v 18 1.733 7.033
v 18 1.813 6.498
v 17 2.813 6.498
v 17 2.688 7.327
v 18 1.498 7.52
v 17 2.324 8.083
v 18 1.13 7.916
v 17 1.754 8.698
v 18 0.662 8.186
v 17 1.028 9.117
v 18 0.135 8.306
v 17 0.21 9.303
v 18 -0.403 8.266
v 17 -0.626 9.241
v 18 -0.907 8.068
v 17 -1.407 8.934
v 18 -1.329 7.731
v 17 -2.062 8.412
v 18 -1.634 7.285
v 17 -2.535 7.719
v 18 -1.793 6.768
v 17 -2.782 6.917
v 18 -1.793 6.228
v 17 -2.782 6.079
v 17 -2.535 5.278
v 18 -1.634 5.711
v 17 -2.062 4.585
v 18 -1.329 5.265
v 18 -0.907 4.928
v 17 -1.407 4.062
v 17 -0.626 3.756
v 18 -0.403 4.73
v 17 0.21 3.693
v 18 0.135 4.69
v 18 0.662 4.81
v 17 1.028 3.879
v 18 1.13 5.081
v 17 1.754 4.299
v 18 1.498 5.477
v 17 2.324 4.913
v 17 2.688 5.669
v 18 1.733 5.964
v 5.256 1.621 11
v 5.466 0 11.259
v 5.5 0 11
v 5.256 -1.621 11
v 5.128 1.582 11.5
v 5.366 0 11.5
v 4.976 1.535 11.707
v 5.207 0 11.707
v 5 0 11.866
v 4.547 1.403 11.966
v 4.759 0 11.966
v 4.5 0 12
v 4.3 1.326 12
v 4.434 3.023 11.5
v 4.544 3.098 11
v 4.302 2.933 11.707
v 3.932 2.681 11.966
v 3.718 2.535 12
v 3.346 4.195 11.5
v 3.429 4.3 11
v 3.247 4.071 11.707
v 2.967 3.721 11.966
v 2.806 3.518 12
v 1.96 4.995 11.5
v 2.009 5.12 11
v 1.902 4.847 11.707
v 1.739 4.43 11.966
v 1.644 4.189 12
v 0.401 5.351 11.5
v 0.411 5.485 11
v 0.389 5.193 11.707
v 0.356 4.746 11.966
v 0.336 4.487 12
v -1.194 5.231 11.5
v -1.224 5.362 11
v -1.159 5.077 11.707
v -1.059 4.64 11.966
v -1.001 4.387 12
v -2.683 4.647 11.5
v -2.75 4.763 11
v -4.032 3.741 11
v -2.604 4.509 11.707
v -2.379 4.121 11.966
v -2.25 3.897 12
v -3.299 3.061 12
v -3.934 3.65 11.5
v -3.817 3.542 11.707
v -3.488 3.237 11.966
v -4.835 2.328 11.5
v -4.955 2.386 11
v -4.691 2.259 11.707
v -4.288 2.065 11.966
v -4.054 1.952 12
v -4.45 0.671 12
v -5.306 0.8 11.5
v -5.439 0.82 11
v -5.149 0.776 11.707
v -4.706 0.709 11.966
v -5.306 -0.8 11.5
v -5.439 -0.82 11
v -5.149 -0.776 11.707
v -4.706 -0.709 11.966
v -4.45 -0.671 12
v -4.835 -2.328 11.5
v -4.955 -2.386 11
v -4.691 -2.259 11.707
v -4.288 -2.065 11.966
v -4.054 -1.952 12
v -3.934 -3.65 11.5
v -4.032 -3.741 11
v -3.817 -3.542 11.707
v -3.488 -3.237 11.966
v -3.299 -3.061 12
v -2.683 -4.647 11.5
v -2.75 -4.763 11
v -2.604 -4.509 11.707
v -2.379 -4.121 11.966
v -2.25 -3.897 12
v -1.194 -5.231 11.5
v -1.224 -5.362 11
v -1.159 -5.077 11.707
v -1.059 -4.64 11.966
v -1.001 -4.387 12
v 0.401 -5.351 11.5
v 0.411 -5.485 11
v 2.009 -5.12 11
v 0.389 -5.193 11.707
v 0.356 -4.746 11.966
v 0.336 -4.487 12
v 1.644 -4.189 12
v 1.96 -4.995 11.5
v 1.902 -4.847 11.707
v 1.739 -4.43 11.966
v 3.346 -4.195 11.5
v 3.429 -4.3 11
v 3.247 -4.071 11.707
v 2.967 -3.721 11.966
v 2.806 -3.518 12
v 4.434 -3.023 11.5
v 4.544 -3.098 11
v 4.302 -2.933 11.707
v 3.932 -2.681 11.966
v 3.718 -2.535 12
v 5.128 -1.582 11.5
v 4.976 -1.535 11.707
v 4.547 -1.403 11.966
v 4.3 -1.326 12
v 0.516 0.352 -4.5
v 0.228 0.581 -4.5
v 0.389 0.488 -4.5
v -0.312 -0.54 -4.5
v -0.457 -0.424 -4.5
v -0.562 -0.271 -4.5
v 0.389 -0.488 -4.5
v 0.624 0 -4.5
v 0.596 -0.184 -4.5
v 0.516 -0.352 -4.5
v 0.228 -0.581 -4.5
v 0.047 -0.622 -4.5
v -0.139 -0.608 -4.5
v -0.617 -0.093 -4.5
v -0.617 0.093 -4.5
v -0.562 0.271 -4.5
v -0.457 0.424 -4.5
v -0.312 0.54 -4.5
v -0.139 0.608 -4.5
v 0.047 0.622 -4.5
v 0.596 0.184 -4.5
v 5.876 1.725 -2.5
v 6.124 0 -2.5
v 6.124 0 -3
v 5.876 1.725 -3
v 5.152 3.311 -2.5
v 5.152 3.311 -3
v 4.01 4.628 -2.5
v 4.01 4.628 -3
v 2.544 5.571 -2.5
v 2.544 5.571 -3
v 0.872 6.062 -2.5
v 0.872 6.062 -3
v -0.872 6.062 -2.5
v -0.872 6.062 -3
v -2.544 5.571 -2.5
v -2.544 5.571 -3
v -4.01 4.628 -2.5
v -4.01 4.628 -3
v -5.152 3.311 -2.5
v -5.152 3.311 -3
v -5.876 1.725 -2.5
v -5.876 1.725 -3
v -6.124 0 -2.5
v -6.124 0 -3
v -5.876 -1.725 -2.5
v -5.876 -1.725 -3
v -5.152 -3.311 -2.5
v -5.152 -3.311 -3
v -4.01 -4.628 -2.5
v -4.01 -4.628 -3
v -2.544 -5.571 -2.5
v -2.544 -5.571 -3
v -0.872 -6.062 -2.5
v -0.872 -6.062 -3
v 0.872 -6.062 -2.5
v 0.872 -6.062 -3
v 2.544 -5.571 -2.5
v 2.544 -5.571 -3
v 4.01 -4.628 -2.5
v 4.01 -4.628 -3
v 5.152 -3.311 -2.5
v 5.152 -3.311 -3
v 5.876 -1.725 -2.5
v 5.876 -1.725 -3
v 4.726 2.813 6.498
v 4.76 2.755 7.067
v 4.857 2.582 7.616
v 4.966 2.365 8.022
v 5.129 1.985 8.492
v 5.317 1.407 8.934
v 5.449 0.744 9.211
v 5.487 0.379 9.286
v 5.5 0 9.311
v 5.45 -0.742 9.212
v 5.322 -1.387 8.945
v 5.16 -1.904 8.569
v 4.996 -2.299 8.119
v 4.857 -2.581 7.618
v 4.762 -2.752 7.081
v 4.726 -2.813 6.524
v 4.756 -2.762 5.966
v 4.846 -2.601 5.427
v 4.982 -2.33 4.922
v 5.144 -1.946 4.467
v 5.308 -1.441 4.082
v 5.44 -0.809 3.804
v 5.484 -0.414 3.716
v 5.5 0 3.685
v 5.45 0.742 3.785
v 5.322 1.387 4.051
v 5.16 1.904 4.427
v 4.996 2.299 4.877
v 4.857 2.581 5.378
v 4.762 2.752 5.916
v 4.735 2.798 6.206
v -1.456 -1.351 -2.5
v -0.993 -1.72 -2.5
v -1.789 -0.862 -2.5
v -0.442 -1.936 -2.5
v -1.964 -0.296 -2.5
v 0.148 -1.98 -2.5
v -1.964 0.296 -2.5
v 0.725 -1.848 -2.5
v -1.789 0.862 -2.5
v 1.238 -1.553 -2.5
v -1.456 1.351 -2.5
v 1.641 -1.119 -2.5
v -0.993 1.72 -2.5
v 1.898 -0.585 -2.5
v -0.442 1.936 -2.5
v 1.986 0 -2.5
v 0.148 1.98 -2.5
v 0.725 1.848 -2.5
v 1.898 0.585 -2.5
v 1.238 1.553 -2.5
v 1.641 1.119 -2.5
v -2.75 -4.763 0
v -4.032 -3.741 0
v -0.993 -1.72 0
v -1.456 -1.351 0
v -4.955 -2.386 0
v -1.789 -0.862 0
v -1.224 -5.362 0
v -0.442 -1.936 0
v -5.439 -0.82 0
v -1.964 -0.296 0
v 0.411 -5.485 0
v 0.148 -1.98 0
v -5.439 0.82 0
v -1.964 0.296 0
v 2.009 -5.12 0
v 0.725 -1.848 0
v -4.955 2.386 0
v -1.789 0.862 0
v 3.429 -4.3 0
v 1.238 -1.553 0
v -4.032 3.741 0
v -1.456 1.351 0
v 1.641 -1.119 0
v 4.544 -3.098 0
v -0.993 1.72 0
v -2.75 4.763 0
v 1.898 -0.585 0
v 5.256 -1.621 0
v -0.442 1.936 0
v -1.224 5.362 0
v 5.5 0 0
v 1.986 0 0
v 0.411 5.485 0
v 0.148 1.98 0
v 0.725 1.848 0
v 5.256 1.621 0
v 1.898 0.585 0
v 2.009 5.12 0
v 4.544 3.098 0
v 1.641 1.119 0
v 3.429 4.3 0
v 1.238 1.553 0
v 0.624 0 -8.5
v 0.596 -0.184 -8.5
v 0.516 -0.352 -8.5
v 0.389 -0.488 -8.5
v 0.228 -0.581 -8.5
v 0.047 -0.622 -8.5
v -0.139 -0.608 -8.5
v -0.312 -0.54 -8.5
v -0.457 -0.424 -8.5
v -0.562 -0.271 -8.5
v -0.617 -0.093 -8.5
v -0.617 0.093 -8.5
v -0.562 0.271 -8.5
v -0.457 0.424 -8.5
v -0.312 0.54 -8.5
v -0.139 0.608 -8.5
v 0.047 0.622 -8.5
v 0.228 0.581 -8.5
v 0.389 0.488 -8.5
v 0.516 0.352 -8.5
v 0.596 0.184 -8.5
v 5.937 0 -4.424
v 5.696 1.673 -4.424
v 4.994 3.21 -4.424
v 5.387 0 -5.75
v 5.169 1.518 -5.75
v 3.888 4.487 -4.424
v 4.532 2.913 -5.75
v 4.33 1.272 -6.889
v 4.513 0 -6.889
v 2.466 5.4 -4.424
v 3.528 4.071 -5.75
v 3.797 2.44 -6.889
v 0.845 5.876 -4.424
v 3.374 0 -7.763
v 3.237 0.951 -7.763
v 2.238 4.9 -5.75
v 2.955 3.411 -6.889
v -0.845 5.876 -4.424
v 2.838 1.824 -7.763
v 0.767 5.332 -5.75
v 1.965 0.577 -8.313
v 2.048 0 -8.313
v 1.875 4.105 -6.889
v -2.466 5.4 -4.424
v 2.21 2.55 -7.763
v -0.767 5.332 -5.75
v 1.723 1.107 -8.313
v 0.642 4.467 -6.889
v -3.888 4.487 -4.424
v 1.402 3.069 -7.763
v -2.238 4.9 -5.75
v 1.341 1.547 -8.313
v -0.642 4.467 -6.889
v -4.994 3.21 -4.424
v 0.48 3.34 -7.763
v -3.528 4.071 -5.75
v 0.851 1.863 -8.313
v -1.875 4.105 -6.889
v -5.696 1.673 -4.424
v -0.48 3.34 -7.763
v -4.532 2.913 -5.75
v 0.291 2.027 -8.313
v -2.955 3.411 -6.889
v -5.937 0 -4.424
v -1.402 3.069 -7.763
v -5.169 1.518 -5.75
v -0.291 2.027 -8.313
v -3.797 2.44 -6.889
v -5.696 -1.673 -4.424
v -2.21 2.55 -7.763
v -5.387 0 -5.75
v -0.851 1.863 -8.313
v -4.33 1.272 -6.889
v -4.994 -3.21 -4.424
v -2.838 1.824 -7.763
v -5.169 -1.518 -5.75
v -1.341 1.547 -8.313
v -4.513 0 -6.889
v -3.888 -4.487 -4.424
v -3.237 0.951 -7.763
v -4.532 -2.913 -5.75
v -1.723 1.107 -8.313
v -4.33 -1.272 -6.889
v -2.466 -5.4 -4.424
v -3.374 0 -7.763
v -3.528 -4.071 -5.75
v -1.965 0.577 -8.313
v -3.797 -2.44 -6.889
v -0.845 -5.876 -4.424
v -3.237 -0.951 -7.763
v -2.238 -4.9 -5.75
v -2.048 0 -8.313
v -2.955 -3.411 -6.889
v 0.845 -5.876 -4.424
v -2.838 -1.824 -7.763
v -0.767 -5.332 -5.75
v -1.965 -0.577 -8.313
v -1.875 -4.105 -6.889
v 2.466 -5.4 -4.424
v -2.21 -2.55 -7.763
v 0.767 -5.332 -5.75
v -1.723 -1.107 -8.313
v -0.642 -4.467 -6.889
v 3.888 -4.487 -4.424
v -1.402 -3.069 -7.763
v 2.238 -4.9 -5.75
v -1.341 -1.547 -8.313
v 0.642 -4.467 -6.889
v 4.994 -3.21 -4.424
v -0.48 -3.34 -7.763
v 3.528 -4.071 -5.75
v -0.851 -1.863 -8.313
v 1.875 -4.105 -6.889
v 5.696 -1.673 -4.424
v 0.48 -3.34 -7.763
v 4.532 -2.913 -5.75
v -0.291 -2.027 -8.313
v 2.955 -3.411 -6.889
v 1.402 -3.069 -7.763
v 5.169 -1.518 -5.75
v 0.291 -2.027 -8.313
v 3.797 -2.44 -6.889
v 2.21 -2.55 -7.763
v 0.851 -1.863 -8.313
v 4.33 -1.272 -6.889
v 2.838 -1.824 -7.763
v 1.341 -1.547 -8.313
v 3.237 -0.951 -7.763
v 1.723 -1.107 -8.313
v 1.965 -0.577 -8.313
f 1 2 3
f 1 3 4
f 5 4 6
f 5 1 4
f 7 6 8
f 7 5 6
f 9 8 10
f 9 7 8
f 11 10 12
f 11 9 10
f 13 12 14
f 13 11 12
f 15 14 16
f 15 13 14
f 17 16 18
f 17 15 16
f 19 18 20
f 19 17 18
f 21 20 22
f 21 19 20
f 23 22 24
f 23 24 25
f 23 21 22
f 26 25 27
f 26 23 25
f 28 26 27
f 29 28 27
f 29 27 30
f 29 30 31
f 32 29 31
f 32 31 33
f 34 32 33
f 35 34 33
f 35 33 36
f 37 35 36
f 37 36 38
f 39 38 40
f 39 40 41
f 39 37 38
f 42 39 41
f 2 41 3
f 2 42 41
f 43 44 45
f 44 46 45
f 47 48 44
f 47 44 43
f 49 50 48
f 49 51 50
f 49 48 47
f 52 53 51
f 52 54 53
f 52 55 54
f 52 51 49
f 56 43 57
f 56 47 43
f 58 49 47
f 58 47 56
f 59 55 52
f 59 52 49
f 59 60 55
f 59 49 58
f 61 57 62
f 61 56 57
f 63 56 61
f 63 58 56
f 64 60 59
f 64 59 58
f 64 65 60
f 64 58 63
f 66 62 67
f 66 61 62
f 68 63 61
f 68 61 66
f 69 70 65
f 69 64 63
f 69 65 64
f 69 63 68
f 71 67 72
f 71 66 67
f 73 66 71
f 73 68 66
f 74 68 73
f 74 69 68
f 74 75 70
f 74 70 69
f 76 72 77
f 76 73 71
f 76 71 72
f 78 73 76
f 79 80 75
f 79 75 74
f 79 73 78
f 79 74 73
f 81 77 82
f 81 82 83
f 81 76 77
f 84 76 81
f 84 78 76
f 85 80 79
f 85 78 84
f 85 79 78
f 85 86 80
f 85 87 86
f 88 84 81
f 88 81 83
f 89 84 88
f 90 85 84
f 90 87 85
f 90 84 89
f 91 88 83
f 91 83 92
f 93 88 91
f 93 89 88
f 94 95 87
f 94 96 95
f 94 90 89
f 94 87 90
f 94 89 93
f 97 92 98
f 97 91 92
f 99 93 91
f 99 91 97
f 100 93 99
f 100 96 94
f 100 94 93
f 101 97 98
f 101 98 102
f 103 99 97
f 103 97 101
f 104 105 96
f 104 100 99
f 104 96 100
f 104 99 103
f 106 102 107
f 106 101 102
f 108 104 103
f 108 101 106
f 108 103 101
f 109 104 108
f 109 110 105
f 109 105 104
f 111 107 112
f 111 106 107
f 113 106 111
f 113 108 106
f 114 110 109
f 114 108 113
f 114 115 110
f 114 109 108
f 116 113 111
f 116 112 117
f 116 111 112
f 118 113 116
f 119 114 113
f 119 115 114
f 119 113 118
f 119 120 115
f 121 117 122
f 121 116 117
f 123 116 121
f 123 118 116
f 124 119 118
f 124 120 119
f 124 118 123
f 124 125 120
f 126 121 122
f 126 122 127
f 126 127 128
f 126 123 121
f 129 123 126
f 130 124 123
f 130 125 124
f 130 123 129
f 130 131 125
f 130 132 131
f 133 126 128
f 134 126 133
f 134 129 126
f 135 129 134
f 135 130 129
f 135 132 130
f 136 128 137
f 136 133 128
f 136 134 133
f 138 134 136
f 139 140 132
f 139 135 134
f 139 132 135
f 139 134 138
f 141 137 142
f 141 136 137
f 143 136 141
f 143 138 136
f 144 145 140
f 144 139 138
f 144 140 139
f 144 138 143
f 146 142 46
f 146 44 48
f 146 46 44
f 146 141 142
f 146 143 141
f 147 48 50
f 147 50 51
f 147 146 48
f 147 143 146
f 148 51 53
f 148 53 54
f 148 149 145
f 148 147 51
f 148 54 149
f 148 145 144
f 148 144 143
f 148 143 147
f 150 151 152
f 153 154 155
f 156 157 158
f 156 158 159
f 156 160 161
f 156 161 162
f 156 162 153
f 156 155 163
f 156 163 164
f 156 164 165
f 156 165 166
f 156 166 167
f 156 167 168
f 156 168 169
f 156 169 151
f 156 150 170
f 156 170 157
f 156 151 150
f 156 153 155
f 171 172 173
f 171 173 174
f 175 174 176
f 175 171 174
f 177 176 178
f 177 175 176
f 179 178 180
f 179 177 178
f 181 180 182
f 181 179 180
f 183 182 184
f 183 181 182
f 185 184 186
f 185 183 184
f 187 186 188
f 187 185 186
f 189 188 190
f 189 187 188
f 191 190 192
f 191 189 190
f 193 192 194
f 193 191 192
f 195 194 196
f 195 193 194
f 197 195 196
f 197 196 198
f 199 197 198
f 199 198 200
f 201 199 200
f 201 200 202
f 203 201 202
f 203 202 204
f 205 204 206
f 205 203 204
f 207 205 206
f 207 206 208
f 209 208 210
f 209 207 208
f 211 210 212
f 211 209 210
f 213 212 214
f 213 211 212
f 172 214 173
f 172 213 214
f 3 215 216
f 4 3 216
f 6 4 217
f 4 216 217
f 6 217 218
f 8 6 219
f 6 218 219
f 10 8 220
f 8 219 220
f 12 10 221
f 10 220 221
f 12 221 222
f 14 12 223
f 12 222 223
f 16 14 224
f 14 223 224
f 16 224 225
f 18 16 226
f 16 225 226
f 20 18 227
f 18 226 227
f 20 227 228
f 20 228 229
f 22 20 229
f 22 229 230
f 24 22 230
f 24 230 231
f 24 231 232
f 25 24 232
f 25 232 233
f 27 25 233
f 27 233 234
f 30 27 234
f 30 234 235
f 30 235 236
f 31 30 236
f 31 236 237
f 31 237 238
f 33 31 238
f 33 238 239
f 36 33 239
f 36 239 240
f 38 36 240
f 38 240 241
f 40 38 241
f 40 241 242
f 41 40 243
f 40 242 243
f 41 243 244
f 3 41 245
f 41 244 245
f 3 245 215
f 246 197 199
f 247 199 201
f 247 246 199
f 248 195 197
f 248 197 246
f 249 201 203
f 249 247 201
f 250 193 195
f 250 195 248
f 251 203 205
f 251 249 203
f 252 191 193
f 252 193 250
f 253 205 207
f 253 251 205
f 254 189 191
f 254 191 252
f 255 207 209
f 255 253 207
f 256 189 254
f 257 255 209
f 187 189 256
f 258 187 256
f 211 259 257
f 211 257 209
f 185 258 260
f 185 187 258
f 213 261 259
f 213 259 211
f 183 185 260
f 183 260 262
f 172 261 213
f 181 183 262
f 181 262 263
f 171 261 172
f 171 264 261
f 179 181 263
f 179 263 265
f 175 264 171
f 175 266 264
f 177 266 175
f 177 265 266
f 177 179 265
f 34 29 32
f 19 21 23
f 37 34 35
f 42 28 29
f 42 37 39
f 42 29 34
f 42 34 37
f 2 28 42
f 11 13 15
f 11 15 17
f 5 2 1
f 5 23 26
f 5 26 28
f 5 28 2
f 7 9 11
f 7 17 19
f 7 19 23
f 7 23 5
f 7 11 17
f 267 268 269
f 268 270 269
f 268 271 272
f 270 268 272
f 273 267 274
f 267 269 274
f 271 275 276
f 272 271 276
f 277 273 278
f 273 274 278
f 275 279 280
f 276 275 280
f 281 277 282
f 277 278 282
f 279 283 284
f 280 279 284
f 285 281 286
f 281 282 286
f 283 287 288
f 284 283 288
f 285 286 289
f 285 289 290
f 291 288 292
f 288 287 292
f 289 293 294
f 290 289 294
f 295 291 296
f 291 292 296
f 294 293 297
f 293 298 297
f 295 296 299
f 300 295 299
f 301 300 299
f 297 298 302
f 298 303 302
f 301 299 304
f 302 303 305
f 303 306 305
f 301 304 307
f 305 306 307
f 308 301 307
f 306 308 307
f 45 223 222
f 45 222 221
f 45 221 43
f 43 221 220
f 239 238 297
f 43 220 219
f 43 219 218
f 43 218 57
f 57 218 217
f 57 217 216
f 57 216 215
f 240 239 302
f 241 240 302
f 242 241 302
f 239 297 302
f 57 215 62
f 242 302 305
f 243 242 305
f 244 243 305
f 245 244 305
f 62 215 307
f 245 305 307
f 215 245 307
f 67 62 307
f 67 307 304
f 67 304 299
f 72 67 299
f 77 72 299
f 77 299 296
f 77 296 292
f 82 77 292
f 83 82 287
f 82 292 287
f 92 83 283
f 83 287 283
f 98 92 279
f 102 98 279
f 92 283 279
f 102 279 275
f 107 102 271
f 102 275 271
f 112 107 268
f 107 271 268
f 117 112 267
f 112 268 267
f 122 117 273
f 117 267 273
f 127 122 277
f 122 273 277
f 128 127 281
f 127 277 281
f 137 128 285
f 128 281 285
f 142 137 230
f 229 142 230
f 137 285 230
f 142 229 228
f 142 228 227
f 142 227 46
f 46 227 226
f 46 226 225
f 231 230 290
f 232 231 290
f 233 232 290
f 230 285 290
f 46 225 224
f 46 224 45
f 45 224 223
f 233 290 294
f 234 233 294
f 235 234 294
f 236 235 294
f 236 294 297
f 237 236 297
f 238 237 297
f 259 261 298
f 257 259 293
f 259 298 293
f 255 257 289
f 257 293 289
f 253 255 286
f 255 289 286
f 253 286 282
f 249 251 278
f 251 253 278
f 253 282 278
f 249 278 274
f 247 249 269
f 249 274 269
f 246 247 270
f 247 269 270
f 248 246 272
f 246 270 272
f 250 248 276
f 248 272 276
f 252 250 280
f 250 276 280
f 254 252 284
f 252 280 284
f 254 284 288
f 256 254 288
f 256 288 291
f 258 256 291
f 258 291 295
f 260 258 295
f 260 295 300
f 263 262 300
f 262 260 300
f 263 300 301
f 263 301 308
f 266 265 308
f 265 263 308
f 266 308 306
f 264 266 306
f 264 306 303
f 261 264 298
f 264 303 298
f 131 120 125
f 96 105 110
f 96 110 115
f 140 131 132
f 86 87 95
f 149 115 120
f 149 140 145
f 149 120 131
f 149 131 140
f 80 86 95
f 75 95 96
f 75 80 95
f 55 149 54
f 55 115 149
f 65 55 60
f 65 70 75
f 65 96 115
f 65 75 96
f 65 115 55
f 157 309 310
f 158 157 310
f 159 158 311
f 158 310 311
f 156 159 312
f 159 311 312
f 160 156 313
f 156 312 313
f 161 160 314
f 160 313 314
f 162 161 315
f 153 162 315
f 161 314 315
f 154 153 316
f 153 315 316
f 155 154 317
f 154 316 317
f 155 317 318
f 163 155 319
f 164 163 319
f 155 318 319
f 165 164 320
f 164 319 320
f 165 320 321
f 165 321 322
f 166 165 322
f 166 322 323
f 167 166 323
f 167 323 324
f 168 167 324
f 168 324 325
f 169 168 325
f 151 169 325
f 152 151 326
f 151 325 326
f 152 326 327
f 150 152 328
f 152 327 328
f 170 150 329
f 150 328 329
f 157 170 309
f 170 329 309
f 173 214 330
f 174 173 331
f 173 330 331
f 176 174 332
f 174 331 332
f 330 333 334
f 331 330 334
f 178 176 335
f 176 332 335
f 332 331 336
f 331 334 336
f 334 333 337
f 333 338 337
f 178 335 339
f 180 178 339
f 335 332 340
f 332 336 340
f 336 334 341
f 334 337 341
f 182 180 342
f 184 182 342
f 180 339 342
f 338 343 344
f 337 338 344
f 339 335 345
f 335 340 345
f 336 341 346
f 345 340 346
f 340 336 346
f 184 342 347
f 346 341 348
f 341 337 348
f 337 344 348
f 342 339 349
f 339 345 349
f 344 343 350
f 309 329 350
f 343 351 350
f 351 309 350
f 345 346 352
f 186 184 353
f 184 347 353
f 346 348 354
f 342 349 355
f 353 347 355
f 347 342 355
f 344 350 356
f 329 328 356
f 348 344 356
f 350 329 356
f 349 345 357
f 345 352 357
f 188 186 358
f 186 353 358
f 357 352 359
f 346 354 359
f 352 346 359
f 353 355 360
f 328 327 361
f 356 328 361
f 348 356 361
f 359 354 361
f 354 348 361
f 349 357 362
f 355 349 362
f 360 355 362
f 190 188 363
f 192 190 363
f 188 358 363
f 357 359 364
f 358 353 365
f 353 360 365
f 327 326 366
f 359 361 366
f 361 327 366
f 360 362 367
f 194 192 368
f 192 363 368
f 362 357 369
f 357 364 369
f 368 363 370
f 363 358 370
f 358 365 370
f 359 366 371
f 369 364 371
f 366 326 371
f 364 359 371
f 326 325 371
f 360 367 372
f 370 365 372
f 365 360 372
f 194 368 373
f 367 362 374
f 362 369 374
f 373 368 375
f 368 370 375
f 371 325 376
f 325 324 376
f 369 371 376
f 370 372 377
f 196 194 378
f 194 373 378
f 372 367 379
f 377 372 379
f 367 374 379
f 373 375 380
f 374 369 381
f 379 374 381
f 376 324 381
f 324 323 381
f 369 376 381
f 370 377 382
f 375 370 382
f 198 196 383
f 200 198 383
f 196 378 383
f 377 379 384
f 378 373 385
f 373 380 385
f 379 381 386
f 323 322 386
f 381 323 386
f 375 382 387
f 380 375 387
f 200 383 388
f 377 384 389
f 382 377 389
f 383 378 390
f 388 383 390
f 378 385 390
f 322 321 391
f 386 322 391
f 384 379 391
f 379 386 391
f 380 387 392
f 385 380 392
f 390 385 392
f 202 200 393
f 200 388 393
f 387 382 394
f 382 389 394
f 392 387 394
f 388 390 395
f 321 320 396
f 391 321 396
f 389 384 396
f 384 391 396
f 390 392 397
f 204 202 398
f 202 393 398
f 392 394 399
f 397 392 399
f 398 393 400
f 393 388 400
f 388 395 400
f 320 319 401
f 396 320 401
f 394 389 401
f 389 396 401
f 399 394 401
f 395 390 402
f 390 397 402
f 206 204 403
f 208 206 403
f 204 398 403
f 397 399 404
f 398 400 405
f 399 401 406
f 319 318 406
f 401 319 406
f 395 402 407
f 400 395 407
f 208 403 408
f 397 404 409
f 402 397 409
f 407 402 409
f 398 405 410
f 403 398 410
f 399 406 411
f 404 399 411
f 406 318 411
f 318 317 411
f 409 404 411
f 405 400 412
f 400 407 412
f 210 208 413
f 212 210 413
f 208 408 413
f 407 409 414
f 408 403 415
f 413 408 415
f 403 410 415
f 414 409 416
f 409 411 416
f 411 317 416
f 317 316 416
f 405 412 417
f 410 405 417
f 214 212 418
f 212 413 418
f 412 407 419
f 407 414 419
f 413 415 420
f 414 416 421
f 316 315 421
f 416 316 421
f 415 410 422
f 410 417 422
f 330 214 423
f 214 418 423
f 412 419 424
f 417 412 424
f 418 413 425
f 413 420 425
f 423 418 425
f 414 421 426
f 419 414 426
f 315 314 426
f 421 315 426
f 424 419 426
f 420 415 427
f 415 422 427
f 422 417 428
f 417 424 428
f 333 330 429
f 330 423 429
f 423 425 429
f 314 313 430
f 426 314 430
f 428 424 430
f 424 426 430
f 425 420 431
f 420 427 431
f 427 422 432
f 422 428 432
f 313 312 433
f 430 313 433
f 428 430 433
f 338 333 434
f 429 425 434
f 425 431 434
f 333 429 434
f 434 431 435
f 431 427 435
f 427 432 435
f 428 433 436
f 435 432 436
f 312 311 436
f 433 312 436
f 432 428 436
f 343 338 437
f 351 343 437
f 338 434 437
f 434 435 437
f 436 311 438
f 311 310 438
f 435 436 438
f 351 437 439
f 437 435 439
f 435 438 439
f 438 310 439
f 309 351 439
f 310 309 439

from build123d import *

# Parameters (mm, degrees)
F0_R      = 5.5
F1_DEPTH  = 12
F2_R      = 1
F3_R      = 1.98573
F4_DEPTH  = 5
F6_R      = 6.124075
F7_DEPTH  = 6
F8_R      = 5.5
F7_FACE_R = 0.624075
F9_DEPTH  = 4
F10_R     = 2.813171
F11_DEPTH = 18
F12_SIZE  = 1


with BuildPart() as f1:
    # F0 (on Top) → F1 (new body)
    with BuildSketch(Plane.XY):
        Circle(F0_R)
    extrude(amount=F1_DEPTH)

    # F2
    f2_edges = [f1.edges().sort_by_distance(p)[0] for p in [
        (-5.5, 0, 12),
    ]]
    fillet(f2_edges, radius=F2_R)

    # F3 (on face) → F4 (join)
    with BuildSketch(Plane(origin=(0, 0, 0), x_dir=(1, 0, 0), z_dir=(0, 0, -1))):
        Circle(F3_R)
    extrude(amount=F4_DEPTH)

    # F6 (on offset) → F7 (join)
    with BuildSketch(Plane.XY.offset(-2.5)):
        Circle(F6_R)
    extrude(amount=-F7_DEPTH)

    # F8
    f8_edges = [f1.edges().sort_by_distance(p)[0] for p in [
        (-6.124075, 0, -8.5),
    ]]
    fillet(f8_edges, radius=F8_R)

    # F7_face (on face) → F9 (cut)
    with BuildSketch(Plane(origin=(0, 0, -8.5), x_dir=(1, 0, 0), z_dir=(0, 0, -1))):
        Circle(F7_FACE_R)
    extrude(amount=-F9_DEPTH, mode=Mode.SUBTRACT)

    # F10 (on Right) → F11 (join)
    with BuildSketch(Plane.YZ):
        with Locations((0, 6.498161)):
            Circle(F10_R)
    extrude(amount=F11_DEPTH)

    # F12
    f12_edges = [f1.edges().sort_by_distance(p)[0] for p in [
        (18, -2.813171, 6.498161),
    ]]
    chamfer(f12_edges, length=F12_SIZE)


solid = f1.part
